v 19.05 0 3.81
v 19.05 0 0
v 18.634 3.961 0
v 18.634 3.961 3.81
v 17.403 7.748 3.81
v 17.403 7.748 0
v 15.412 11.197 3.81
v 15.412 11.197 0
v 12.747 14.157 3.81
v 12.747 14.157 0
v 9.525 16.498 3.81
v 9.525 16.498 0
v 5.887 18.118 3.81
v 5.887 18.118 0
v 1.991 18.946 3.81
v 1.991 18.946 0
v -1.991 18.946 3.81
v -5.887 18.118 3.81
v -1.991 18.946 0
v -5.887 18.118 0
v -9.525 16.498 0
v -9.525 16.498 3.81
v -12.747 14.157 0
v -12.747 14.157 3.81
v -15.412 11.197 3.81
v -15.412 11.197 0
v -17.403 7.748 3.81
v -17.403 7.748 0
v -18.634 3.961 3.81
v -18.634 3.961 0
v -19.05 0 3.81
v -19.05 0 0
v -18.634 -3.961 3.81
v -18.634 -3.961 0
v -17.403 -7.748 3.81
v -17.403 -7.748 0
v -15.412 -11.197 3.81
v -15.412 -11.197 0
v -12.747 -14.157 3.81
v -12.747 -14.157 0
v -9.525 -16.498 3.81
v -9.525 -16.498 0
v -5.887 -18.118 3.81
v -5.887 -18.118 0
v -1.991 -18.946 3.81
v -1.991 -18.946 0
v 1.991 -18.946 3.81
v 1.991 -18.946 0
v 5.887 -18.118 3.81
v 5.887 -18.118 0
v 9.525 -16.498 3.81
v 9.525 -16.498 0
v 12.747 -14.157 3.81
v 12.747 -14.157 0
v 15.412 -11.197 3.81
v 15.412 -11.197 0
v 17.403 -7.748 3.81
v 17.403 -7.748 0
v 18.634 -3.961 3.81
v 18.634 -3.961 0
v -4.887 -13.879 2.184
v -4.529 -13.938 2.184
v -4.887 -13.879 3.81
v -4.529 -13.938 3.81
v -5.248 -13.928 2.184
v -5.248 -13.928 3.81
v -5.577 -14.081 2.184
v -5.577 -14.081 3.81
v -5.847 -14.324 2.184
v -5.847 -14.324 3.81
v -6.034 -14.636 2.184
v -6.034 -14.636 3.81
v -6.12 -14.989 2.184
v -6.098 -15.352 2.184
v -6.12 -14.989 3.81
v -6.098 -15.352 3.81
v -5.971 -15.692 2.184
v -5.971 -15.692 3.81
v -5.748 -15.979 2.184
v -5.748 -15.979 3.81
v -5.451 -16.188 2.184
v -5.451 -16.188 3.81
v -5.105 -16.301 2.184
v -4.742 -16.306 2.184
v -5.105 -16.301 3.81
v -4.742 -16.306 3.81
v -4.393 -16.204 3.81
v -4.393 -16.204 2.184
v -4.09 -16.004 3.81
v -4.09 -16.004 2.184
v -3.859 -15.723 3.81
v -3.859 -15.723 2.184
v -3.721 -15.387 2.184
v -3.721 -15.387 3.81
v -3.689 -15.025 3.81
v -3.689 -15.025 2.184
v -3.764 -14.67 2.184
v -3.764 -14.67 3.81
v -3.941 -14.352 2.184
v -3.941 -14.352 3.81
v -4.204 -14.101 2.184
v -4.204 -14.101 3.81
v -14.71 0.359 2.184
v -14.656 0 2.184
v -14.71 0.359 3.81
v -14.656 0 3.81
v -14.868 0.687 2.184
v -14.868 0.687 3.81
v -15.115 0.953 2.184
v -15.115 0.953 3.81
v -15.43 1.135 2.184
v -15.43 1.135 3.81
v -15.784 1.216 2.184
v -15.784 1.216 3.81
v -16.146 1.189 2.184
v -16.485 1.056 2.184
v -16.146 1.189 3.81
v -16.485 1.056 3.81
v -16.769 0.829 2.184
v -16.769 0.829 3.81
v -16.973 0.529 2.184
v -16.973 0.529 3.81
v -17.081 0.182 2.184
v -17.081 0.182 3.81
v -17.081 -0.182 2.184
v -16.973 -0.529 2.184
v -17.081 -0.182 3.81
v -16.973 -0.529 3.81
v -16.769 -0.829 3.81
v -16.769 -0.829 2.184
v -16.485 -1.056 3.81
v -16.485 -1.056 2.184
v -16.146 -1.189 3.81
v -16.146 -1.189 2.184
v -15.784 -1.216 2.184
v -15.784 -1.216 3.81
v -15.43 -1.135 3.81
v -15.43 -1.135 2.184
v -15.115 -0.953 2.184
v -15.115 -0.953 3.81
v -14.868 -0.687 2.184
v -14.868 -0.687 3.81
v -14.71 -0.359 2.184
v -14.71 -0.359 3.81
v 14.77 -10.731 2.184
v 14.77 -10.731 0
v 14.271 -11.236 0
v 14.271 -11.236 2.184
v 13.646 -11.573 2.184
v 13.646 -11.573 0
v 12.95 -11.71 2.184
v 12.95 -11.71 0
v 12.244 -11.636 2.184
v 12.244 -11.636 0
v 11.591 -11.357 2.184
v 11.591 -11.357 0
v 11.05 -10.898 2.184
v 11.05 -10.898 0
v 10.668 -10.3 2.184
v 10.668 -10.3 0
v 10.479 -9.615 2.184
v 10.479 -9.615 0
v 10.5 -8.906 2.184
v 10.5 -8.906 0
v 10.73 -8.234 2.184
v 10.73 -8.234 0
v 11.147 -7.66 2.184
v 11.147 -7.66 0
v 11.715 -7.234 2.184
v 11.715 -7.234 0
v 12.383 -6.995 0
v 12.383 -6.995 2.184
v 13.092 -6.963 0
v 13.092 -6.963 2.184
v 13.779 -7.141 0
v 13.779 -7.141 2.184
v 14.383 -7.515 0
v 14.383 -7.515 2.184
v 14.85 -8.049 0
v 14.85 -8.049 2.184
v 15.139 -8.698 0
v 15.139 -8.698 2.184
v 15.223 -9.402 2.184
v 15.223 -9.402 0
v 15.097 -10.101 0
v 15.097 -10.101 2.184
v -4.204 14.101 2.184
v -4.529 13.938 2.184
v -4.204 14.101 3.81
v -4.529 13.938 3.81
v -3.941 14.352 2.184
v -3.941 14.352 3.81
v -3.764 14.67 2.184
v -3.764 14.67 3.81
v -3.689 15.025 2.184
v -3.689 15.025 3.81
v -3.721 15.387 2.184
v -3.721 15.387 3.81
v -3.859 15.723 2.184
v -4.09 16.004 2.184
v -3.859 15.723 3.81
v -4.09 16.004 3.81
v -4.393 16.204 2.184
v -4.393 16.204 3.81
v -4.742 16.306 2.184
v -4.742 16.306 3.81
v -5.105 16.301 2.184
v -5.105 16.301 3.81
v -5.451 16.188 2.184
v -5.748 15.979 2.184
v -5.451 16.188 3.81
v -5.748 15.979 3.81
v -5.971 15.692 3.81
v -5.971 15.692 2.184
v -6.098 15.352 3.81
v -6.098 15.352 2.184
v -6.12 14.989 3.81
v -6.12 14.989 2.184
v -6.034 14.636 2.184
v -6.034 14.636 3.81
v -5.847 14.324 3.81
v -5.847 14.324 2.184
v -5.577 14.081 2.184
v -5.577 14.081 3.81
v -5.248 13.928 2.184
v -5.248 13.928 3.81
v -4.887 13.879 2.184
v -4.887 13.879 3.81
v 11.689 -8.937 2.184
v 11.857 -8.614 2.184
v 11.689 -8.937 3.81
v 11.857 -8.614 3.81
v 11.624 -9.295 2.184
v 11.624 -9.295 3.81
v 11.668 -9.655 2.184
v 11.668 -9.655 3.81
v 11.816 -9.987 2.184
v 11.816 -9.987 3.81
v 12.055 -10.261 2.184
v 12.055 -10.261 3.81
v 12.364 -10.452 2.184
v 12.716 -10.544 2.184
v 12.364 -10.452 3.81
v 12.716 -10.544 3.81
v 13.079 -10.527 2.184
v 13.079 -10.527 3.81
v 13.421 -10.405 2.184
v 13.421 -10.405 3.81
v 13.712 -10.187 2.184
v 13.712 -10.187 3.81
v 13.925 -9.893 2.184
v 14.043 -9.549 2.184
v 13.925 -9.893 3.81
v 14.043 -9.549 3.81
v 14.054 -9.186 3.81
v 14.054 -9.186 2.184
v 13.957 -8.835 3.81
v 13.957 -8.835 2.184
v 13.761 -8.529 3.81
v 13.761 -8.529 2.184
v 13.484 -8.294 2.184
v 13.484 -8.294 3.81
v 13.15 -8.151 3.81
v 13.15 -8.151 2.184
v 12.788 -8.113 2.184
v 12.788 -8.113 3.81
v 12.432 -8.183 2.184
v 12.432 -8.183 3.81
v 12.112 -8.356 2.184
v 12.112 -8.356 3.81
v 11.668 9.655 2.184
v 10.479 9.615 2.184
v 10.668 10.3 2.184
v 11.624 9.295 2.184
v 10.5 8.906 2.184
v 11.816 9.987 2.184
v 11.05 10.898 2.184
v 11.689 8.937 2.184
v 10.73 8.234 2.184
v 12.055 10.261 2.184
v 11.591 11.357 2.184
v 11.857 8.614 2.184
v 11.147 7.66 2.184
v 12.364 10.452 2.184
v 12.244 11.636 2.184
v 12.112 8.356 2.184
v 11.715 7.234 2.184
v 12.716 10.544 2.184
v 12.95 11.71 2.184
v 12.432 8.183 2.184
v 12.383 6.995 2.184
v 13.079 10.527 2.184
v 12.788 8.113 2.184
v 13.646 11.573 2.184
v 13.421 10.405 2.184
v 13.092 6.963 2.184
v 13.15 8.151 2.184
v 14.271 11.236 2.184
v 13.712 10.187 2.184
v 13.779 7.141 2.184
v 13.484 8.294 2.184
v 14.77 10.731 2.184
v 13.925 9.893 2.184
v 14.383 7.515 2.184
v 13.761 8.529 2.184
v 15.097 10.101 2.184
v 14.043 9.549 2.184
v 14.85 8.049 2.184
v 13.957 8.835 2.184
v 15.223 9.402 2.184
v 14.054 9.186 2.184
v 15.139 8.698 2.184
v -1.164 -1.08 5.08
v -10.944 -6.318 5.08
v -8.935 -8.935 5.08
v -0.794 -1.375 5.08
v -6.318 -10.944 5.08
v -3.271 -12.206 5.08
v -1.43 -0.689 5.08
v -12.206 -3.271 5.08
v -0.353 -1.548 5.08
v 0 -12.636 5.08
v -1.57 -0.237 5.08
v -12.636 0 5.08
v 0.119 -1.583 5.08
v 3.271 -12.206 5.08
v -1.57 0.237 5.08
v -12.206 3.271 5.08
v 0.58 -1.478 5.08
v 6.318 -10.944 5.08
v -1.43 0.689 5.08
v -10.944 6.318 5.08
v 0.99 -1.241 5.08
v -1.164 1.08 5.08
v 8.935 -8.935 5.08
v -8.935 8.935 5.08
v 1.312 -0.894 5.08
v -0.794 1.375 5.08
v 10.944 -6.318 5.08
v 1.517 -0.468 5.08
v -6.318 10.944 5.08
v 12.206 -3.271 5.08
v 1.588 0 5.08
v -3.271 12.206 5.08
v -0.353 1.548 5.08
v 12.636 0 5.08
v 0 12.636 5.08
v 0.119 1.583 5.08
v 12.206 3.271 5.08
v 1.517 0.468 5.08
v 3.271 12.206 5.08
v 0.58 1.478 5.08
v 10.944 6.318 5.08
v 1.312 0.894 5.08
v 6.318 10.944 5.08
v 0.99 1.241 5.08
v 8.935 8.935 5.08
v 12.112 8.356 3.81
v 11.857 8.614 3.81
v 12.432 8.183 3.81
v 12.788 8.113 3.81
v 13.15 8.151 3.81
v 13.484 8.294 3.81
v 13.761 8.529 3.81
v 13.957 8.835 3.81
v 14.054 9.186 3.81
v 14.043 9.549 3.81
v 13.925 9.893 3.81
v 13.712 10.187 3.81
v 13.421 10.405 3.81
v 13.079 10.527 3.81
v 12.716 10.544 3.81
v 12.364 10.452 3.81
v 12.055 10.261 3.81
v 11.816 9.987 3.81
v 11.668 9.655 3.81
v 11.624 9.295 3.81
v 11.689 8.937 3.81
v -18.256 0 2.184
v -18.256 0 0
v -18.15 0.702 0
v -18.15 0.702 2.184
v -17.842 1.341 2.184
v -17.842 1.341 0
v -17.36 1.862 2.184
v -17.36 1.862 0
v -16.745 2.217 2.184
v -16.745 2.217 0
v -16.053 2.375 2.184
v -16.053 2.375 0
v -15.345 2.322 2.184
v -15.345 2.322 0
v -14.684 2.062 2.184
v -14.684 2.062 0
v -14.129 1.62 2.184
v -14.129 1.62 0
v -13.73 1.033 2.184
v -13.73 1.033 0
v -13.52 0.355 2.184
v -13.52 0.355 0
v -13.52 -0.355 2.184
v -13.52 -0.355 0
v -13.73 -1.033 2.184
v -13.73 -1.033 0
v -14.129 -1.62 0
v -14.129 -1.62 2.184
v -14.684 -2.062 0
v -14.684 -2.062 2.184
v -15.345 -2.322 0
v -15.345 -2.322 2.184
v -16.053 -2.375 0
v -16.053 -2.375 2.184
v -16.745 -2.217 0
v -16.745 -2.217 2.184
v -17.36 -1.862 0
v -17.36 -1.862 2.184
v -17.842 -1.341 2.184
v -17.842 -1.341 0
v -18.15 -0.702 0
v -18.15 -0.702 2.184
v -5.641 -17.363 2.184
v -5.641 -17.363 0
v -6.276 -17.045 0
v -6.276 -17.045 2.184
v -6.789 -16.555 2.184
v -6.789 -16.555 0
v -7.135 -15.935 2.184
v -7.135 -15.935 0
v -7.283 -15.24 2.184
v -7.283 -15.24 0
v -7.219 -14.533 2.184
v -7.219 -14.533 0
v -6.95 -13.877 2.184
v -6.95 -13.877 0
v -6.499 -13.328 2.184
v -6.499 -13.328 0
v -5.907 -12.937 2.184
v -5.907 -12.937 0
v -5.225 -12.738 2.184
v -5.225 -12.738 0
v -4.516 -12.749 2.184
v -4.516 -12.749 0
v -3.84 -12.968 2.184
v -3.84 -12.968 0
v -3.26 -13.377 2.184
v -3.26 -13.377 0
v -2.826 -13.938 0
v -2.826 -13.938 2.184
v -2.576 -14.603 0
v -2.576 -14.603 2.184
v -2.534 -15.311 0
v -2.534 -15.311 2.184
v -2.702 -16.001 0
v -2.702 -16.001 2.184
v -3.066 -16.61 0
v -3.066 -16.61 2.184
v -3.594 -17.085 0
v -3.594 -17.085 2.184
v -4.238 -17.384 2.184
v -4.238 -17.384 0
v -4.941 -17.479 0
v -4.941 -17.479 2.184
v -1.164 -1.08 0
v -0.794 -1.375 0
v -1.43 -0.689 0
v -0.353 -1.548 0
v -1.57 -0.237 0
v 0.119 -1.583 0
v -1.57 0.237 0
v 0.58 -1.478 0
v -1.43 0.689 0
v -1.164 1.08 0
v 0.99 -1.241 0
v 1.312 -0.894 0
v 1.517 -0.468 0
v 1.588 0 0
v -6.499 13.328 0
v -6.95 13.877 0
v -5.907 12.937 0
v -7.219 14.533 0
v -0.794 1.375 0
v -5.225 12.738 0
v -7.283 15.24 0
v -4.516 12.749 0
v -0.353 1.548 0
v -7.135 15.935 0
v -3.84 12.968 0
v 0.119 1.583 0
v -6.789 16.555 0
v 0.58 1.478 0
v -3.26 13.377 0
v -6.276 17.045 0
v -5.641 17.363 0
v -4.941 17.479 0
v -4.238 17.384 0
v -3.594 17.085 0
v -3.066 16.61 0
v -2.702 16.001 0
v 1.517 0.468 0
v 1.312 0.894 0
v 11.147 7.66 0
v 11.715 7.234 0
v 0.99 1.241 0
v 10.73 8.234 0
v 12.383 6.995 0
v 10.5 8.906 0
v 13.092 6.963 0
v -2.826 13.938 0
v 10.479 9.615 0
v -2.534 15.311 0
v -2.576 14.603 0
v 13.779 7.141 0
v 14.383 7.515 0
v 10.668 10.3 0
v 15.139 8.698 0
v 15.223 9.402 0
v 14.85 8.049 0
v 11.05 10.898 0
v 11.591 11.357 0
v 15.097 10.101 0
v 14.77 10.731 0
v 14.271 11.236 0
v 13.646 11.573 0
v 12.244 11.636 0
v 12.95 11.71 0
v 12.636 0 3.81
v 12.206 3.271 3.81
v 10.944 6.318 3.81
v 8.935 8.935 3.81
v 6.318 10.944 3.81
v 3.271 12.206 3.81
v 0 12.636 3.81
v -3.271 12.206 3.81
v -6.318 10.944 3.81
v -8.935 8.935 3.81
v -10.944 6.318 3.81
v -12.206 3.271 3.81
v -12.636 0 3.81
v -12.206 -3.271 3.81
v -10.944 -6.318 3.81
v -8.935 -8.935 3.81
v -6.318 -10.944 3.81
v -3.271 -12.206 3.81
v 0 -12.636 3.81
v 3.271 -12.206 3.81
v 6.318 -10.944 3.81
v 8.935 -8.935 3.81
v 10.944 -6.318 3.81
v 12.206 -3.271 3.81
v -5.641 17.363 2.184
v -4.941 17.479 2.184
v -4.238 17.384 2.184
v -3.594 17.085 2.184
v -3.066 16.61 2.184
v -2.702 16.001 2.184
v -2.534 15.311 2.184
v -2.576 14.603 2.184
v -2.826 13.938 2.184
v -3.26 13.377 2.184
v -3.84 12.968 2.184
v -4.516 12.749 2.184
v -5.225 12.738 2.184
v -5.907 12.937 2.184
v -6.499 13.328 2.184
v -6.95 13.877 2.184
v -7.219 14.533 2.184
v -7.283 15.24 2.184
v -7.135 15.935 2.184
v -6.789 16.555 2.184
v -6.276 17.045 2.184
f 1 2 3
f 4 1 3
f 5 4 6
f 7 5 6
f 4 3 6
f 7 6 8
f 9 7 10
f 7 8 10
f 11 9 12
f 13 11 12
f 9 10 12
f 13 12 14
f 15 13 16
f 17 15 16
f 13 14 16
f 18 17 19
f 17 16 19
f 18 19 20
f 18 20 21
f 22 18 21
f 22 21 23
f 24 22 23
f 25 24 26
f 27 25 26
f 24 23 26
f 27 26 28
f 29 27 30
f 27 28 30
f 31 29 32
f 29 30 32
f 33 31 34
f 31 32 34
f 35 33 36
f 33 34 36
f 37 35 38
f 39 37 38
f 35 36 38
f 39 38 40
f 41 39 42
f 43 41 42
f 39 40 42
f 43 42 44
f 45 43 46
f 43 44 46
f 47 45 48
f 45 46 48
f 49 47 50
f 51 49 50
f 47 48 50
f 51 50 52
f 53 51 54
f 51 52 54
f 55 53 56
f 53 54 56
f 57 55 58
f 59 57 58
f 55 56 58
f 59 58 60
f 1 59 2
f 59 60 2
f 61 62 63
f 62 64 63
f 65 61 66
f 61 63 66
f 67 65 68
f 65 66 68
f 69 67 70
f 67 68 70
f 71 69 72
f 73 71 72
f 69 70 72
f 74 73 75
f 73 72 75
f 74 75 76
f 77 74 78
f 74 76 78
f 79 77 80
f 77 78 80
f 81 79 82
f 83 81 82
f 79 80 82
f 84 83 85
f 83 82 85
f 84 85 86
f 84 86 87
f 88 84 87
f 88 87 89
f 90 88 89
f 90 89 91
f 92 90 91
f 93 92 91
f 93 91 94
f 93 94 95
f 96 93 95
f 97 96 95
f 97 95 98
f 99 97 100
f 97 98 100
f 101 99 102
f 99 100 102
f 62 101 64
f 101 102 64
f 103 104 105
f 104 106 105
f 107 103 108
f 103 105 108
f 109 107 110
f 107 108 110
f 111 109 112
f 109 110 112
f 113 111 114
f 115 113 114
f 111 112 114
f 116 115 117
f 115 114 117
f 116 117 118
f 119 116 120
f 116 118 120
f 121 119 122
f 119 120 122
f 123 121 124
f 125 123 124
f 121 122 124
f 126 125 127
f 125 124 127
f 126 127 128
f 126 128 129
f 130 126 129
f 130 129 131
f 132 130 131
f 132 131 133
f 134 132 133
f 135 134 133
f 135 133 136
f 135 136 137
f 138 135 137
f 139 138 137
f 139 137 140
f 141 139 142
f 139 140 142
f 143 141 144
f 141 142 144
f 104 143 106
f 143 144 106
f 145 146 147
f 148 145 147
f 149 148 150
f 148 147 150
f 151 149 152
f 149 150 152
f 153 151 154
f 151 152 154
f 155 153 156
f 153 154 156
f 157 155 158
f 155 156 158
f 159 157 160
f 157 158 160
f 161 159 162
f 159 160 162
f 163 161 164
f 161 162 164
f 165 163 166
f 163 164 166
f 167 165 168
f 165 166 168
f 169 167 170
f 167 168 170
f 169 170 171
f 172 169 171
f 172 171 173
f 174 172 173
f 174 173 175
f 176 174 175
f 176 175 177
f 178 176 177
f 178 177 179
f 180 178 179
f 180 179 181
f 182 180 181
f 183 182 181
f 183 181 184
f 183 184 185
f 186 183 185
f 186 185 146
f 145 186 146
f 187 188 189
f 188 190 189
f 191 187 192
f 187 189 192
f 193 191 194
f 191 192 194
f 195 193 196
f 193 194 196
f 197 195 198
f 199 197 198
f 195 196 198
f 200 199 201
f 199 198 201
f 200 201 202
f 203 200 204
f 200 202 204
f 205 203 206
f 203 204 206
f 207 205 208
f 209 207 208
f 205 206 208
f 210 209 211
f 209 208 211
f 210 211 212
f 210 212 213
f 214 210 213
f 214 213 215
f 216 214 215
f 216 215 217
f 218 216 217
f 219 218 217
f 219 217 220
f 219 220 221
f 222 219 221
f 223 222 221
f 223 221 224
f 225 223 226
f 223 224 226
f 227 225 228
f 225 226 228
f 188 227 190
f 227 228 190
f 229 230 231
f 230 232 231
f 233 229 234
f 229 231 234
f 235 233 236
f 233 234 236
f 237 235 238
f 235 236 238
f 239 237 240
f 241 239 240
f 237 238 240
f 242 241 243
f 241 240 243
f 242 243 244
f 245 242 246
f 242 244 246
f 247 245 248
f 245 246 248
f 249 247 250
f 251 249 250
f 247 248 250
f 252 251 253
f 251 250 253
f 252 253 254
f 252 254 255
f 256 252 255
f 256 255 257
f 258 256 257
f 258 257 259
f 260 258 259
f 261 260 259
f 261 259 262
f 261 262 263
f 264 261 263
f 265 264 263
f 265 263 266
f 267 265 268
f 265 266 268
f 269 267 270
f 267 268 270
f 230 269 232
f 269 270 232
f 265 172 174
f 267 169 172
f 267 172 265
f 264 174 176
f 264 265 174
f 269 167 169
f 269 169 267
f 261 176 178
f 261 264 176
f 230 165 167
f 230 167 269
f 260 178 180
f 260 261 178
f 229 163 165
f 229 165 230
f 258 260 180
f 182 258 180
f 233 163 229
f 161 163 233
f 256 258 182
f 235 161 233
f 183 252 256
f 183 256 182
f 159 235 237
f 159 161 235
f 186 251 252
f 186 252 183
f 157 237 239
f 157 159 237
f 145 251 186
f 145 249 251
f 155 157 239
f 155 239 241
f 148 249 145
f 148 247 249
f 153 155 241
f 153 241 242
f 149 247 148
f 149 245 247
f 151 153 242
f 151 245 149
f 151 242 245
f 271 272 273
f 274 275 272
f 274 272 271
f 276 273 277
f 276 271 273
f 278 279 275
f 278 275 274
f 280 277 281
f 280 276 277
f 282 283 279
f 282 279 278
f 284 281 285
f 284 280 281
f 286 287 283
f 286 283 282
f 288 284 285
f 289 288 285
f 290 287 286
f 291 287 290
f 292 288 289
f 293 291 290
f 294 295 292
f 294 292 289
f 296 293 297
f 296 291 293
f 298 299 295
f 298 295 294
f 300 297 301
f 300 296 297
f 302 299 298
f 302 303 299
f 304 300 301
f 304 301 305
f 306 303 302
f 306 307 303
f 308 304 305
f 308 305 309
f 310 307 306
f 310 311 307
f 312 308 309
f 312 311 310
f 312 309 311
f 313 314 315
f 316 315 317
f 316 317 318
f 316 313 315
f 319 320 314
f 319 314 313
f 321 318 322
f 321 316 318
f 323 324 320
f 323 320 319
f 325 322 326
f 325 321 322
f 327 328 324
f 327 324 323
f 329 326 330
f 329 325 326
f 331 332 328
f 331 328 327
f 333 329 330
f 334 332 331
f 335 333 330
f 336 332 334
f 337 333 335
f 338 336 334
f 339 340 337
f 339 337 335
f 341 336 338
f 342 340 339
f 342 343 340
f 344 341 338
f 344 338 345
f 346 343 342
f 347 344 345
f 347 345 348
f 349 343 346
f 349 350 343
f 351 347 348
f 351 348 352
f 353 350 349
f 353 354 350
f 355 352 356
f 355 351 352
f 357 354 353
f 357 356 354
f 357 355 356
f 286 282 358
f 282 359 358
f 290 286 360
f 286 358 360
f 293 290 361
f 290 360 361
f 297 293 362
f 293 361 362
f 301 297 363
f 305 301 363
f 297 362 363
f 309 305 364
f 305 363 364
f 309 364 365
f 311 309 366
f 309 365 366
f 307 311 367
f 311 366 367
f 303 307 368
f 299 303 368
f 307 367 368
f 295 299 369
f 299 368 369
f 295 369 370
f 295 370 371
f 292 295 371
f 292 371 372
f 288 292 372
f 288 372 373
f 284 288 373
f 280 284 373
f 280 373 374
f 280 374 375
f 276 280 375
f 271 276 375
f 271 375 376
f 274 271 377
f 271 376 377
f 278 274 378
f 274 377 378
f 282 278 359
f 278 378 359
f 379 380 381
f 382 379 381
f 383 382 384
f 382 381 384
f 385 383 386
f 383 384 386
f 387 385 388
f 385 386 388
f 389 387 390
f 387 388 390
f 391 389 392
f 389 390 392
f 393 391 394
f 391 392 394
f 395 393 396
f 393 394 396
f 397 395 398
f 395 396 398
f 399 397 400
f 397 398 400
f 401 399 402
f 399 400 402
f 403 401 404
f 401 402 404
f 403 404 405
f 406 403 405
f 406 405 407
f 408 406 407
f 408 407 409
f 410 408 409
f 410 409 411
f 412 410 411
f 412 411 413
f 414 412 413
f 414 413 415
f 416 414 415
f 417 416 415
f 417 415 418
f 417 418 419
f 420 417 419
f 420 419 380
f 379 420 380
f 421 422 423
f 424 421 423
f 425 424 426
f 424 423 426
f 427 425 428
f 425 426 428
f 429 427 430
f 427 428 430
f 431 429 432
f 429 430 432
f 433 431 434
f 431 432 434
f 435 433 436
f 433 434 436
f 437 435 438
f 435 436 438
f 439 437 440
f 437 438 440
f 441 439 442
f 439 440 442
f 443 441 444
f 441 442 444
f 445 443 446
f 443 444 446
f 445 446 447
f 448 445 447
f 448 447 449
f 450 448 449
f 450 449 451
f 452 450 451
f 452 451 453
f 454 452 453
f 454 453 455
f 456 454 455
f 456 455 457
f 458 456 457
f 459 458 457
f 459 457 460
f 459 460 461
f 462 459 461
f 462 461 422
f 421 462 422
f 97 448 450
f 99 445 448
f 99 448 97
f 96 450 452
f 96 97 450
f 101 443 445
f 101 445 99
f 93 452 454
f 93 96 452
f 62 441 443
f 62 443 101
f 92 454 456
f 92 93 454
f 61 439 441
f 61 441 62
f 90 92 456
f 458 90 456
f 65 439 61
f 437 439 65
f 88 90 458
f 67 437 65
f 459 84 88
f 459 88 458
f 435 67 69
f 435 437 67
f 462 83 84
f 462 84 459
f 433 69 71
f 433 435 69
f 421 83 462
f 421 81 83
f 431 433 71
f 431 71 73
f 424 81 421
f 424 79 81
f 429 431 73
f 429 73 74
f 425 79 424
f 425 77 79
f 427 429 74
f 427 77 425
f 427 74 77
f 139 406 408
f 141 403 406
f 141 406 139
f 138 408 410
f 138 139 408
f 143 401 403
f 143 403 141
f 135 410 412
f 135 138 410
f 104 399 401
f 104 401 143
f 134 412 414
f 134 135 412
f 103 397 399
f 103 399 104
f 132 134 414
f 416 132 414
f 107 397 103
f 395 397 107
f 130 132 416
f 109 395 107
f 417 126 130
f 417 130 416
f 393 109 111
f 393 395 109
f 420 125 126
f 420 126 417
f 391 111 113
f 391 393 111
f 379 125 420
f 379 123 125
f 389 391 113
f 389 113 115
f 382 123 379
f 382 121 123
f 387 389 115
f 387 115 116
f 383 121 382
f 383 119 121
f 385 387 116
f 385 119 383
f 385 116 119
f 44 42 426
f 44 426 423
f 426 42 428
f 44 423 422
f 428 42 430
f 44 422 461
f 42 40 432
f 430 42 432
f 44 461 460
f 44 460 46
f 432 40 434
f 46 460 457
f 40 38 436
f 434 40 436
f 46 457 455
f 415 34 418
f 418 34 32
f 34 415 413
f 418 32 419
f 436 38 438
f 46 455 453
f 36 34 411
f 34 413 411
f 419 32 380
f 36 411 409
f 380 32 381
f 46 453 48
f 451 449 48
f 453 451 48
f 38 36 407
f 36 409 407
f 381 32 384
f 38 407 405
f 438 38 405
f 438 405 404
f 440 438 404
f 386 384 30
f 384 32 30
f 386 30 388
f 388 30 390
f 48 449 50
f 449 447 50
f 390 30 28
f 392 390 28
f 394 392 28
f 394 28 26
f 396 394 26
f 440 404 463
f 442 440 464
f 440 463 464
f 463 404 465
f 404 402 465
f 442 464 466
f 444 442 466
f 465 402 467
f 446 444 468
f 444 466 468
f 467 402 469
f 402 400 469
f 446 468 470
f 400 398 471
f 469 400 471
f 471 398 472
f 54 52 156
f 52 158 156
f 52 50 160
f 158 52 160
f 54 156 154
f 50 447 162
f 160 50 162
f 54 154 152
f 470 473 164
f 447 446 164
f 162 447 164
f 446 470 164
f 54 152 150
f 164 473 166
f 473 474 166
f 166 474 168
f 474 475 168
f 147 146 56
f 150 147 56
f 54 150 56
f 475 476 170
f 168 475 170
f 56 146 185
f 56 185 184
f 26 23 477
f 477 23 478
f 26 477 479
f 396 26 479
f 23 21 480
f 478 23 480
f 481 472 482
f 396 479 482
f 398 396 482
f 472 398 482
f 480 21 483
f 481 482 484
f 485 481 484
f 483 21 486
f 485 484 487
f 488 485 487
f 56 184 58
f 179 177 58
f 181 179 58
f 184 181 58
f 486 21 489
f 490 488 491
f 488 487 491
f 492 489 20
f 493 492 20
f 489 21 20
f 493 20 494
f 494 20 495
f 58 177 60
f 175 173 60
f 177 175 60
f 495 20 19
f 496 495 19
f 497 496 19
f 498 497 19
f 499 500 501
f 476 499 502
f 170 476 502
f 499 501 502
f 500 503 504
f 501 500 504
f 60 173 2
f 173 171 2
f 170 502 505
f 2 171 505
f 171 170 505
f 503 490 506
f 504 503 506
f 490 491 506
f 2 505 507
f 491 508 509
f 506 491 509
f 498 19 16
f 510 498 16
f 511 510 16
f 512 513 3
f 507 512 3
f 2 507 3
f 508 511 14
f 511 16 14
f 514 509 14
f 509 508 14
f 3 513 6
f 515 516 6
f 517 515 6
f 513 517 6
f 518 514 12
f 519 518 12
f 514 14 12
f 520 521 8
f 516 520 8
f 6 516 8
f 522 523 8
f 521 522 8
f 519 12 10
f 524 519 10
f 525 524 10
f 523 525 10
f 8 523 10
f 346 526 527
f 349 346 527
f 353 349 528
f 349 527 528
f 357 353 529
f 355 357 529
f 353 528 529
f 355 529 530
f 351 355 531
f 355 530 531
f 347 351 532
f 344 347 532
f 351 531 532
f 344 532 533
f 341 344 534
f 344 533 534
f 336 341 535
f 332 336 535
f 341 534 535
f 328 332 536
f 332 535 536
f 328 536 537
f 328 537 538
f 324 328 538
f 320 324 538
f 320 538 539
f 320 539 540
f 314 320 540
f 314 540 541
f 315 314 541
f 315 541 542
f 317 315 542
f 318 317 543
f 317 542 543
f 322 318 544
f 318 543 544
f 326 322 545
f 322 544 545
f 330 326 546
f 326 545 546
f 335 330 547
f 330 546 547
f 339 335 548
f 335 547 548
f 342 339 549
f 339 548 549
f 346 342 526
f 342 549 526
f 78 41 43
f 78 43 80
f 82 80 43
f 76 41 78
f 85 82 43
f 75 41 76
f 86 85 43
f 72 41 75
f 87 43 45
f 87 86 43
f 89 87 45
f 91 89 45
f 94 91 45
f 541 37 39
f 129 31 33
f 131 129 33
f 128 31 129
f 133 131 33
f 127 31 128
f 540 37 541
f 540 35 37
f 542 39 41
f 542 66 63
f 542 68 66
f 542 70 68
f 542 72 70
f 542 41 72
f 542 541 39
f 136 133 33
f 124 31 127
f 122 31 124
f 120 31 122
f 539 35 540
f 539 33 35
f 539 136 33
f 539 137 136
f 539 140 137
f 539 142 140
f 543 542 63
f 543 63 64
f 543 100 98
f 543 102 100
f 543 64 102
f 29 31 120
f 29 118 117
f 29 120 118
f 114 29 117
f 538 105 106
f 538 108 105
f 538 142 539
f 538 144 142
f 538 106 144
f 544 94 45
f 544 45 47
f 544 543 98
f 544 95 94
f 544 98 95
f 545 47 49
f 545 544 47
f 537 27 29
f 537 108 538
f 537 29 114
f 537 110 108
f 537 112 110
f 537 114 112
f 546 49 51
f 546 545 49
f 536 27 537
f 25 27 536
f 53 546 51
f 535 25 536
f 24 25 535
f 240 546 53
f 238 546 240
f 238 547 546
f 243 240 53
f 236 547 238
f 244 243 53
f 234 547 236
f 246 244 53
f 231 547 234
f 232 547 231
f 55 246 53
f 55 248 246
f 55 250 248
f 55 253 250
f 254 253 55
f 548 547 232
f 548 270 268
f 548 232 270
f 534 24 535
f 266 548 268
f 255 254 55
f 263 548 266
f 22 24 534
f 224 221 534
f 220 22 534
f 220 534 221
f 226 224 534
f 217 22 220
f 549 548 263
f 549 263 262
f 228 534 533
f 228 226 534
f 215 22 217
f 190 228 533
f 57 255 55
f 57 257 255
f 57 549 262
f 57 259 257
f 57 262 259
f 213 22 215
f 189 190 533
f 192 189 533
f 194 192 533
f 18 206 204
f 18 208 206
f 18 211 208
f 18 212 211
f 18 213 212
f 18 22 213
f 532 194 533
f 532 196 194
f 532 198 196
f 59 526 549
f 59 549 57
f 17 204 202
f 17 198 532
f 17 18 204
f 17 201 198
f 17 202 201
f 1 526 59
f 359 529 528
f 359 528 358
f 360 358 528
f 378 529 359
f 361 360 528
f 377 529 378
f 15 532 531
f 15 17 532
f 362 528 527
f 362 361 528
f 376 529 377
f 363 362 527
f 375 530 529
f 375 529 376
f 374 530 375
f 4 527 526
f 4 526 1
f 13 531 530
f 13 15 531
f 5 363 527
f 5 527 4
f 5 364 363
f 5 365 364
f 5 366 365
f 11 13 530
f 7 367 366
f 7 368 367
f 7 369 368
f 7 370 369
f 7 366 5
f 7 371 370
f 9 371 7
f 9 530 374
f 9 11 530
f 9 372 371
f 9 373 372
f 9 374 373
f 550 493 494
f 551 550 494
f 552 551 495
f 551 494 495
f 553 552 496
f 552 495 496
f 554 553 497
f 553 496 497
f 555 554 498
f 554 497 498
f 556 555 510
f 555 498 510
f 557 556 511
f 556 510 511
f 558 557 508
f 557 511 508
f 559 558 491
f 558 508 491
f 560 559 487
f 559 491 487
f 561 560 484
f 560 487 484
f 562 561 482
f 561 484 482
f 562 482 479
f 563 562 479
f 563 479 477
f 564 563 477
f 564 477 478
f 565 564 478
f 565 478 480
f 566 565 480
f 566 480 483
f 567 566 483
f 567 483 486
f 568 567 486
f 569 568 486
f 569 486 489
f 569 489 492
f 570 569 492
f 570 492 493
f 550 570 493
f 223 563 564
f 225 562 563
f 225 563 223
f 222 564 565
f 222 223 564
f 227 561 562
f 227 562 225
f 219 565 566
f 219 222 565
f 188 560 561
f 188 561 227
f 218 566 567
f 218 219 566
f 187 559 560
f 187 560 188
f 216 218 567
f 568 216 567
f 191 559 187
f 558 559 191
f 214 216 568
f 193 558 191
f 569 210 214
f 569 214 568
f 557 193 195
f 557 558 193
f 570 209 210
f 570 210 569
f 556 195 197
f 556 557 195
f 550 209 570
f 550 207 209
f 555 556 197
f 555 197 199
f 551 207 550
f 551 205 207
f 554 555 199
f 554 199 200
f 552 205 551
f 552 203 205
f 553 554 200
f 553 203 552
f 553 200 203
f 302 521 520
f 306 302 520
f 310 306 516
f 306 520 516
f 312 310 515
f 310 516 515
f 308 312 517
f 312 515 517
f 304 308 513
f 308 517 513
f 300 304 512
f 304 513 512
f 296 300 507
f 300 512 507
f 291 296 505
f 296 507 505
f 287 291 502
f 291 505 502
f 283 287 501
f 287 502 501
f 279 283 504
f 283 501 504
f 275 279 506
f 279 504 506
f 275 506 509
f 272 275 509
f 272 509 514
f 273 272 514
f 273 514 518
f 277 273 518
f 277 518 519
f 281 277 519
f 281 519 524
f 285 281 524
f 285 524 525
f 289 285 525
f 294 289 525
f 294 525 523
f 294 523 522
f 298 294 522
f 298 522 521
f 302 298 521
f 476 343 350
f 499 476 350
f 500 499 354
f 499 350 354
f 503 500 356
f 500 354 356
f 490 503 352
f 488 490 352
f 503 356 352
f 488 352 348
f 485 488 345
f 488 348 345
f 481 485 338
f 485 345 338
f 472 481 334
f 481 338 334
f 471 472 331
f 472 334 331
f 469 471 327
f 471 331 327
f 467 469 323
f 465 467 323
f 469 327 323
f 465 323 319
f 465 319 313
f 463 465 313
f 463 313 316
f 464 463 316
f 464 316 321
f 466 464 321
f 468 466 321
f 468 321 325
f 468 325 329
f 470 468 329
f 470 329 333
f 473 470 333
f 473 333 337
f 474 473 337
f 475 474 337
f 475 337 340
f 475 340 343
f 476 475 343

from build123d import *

# Parameters (mm, degrees)
SKETCH1_R                                      = 19.05
BOSS_EXTRUDE1_DEPTH                            = 3.81
SKETCH2_R                                      = 12.6365
BOSS_EXTRUDE2_DEPTH                            = 1.27
CBORE_FOR_2_SOCKET_HEAD_CAP_SCREW1_D           = 2.4384
CBORE_FOR_2_SOCKET_HEAD_CAP_SCREW1_CBORE_D     = 4.7625
CBORE_FOR_2_SOCKET_HEAD_CAP_SCREW1_CBORE_DEPTH = 2.1844
CIRPATTERN1_COUNT                              = 5
F_1_8_0_1250_DOWEL_HOLE1_D                     = 3.175


with BuildPart() as part:
    # Sketch1 → Boss-Extrude1 (new body)
    with BuildSketch(Plane.XY):
        Circle(SKETCH1_R)
    extrude(amount=BOSS_EXTRUDE1_DEPTH)

    # Sketch2 → Boss-Extrude2 (add)
    with BuildSketch(Plane.XY.offset(3.81)):
        Circle(SKETCH2_R)
    extrude(amount=BOSS_EXTRUDE2_DEPTH)

    # CBORE for #2 Socket Head Cap Screw1 (through all)
    with Locations(Plane(origin=(0, 0, 0), x_dir=(-1, 0, 0), z_dir=(0, 0, -1))):
        with Locations((15.875, 0)):
            cbore_for_2_socket_head_cap_screw1 = CounterBoreHole(CBORE_FOR_2_SOCKET_HEAD_CAP_SCREW1_D / 2, CBORE_FOR_2_SOCKET_HEAD_CAP_SCREW1_CBORE_D / 2, CBORE_FOR_2_SOCKET_HEAD_CAP_SCREW1_CBORE_DEPTH)

    # CirPattern1: CBORE for #2 Socket Head Cap Screw1 ×5 about axis
    cirpattern1_axis = Axis((0, 0, 0), (0, 0, -1))
    for i in range(1, CIRPATTERN1_COUNT):
        add(cbore_for_2_socket_head_cap_screw1.rotate(cirpattern1_axis, i * 360 / CIRPATTERN1_COUNT), mode=Mode.SUBTRACT)

    # 1/8 (0.1250) Dowel Hole1 (through all)
    with Locations(Plane(origin=(0, 0, 0), x_dir=(-1, 0, 0), z_dir=(0, 0, -1))):
        with Locations((0, 0)):
            Hole(F_1_8_0_1250_DOWEL_HOLE1_D / 2)


solid = part.part
